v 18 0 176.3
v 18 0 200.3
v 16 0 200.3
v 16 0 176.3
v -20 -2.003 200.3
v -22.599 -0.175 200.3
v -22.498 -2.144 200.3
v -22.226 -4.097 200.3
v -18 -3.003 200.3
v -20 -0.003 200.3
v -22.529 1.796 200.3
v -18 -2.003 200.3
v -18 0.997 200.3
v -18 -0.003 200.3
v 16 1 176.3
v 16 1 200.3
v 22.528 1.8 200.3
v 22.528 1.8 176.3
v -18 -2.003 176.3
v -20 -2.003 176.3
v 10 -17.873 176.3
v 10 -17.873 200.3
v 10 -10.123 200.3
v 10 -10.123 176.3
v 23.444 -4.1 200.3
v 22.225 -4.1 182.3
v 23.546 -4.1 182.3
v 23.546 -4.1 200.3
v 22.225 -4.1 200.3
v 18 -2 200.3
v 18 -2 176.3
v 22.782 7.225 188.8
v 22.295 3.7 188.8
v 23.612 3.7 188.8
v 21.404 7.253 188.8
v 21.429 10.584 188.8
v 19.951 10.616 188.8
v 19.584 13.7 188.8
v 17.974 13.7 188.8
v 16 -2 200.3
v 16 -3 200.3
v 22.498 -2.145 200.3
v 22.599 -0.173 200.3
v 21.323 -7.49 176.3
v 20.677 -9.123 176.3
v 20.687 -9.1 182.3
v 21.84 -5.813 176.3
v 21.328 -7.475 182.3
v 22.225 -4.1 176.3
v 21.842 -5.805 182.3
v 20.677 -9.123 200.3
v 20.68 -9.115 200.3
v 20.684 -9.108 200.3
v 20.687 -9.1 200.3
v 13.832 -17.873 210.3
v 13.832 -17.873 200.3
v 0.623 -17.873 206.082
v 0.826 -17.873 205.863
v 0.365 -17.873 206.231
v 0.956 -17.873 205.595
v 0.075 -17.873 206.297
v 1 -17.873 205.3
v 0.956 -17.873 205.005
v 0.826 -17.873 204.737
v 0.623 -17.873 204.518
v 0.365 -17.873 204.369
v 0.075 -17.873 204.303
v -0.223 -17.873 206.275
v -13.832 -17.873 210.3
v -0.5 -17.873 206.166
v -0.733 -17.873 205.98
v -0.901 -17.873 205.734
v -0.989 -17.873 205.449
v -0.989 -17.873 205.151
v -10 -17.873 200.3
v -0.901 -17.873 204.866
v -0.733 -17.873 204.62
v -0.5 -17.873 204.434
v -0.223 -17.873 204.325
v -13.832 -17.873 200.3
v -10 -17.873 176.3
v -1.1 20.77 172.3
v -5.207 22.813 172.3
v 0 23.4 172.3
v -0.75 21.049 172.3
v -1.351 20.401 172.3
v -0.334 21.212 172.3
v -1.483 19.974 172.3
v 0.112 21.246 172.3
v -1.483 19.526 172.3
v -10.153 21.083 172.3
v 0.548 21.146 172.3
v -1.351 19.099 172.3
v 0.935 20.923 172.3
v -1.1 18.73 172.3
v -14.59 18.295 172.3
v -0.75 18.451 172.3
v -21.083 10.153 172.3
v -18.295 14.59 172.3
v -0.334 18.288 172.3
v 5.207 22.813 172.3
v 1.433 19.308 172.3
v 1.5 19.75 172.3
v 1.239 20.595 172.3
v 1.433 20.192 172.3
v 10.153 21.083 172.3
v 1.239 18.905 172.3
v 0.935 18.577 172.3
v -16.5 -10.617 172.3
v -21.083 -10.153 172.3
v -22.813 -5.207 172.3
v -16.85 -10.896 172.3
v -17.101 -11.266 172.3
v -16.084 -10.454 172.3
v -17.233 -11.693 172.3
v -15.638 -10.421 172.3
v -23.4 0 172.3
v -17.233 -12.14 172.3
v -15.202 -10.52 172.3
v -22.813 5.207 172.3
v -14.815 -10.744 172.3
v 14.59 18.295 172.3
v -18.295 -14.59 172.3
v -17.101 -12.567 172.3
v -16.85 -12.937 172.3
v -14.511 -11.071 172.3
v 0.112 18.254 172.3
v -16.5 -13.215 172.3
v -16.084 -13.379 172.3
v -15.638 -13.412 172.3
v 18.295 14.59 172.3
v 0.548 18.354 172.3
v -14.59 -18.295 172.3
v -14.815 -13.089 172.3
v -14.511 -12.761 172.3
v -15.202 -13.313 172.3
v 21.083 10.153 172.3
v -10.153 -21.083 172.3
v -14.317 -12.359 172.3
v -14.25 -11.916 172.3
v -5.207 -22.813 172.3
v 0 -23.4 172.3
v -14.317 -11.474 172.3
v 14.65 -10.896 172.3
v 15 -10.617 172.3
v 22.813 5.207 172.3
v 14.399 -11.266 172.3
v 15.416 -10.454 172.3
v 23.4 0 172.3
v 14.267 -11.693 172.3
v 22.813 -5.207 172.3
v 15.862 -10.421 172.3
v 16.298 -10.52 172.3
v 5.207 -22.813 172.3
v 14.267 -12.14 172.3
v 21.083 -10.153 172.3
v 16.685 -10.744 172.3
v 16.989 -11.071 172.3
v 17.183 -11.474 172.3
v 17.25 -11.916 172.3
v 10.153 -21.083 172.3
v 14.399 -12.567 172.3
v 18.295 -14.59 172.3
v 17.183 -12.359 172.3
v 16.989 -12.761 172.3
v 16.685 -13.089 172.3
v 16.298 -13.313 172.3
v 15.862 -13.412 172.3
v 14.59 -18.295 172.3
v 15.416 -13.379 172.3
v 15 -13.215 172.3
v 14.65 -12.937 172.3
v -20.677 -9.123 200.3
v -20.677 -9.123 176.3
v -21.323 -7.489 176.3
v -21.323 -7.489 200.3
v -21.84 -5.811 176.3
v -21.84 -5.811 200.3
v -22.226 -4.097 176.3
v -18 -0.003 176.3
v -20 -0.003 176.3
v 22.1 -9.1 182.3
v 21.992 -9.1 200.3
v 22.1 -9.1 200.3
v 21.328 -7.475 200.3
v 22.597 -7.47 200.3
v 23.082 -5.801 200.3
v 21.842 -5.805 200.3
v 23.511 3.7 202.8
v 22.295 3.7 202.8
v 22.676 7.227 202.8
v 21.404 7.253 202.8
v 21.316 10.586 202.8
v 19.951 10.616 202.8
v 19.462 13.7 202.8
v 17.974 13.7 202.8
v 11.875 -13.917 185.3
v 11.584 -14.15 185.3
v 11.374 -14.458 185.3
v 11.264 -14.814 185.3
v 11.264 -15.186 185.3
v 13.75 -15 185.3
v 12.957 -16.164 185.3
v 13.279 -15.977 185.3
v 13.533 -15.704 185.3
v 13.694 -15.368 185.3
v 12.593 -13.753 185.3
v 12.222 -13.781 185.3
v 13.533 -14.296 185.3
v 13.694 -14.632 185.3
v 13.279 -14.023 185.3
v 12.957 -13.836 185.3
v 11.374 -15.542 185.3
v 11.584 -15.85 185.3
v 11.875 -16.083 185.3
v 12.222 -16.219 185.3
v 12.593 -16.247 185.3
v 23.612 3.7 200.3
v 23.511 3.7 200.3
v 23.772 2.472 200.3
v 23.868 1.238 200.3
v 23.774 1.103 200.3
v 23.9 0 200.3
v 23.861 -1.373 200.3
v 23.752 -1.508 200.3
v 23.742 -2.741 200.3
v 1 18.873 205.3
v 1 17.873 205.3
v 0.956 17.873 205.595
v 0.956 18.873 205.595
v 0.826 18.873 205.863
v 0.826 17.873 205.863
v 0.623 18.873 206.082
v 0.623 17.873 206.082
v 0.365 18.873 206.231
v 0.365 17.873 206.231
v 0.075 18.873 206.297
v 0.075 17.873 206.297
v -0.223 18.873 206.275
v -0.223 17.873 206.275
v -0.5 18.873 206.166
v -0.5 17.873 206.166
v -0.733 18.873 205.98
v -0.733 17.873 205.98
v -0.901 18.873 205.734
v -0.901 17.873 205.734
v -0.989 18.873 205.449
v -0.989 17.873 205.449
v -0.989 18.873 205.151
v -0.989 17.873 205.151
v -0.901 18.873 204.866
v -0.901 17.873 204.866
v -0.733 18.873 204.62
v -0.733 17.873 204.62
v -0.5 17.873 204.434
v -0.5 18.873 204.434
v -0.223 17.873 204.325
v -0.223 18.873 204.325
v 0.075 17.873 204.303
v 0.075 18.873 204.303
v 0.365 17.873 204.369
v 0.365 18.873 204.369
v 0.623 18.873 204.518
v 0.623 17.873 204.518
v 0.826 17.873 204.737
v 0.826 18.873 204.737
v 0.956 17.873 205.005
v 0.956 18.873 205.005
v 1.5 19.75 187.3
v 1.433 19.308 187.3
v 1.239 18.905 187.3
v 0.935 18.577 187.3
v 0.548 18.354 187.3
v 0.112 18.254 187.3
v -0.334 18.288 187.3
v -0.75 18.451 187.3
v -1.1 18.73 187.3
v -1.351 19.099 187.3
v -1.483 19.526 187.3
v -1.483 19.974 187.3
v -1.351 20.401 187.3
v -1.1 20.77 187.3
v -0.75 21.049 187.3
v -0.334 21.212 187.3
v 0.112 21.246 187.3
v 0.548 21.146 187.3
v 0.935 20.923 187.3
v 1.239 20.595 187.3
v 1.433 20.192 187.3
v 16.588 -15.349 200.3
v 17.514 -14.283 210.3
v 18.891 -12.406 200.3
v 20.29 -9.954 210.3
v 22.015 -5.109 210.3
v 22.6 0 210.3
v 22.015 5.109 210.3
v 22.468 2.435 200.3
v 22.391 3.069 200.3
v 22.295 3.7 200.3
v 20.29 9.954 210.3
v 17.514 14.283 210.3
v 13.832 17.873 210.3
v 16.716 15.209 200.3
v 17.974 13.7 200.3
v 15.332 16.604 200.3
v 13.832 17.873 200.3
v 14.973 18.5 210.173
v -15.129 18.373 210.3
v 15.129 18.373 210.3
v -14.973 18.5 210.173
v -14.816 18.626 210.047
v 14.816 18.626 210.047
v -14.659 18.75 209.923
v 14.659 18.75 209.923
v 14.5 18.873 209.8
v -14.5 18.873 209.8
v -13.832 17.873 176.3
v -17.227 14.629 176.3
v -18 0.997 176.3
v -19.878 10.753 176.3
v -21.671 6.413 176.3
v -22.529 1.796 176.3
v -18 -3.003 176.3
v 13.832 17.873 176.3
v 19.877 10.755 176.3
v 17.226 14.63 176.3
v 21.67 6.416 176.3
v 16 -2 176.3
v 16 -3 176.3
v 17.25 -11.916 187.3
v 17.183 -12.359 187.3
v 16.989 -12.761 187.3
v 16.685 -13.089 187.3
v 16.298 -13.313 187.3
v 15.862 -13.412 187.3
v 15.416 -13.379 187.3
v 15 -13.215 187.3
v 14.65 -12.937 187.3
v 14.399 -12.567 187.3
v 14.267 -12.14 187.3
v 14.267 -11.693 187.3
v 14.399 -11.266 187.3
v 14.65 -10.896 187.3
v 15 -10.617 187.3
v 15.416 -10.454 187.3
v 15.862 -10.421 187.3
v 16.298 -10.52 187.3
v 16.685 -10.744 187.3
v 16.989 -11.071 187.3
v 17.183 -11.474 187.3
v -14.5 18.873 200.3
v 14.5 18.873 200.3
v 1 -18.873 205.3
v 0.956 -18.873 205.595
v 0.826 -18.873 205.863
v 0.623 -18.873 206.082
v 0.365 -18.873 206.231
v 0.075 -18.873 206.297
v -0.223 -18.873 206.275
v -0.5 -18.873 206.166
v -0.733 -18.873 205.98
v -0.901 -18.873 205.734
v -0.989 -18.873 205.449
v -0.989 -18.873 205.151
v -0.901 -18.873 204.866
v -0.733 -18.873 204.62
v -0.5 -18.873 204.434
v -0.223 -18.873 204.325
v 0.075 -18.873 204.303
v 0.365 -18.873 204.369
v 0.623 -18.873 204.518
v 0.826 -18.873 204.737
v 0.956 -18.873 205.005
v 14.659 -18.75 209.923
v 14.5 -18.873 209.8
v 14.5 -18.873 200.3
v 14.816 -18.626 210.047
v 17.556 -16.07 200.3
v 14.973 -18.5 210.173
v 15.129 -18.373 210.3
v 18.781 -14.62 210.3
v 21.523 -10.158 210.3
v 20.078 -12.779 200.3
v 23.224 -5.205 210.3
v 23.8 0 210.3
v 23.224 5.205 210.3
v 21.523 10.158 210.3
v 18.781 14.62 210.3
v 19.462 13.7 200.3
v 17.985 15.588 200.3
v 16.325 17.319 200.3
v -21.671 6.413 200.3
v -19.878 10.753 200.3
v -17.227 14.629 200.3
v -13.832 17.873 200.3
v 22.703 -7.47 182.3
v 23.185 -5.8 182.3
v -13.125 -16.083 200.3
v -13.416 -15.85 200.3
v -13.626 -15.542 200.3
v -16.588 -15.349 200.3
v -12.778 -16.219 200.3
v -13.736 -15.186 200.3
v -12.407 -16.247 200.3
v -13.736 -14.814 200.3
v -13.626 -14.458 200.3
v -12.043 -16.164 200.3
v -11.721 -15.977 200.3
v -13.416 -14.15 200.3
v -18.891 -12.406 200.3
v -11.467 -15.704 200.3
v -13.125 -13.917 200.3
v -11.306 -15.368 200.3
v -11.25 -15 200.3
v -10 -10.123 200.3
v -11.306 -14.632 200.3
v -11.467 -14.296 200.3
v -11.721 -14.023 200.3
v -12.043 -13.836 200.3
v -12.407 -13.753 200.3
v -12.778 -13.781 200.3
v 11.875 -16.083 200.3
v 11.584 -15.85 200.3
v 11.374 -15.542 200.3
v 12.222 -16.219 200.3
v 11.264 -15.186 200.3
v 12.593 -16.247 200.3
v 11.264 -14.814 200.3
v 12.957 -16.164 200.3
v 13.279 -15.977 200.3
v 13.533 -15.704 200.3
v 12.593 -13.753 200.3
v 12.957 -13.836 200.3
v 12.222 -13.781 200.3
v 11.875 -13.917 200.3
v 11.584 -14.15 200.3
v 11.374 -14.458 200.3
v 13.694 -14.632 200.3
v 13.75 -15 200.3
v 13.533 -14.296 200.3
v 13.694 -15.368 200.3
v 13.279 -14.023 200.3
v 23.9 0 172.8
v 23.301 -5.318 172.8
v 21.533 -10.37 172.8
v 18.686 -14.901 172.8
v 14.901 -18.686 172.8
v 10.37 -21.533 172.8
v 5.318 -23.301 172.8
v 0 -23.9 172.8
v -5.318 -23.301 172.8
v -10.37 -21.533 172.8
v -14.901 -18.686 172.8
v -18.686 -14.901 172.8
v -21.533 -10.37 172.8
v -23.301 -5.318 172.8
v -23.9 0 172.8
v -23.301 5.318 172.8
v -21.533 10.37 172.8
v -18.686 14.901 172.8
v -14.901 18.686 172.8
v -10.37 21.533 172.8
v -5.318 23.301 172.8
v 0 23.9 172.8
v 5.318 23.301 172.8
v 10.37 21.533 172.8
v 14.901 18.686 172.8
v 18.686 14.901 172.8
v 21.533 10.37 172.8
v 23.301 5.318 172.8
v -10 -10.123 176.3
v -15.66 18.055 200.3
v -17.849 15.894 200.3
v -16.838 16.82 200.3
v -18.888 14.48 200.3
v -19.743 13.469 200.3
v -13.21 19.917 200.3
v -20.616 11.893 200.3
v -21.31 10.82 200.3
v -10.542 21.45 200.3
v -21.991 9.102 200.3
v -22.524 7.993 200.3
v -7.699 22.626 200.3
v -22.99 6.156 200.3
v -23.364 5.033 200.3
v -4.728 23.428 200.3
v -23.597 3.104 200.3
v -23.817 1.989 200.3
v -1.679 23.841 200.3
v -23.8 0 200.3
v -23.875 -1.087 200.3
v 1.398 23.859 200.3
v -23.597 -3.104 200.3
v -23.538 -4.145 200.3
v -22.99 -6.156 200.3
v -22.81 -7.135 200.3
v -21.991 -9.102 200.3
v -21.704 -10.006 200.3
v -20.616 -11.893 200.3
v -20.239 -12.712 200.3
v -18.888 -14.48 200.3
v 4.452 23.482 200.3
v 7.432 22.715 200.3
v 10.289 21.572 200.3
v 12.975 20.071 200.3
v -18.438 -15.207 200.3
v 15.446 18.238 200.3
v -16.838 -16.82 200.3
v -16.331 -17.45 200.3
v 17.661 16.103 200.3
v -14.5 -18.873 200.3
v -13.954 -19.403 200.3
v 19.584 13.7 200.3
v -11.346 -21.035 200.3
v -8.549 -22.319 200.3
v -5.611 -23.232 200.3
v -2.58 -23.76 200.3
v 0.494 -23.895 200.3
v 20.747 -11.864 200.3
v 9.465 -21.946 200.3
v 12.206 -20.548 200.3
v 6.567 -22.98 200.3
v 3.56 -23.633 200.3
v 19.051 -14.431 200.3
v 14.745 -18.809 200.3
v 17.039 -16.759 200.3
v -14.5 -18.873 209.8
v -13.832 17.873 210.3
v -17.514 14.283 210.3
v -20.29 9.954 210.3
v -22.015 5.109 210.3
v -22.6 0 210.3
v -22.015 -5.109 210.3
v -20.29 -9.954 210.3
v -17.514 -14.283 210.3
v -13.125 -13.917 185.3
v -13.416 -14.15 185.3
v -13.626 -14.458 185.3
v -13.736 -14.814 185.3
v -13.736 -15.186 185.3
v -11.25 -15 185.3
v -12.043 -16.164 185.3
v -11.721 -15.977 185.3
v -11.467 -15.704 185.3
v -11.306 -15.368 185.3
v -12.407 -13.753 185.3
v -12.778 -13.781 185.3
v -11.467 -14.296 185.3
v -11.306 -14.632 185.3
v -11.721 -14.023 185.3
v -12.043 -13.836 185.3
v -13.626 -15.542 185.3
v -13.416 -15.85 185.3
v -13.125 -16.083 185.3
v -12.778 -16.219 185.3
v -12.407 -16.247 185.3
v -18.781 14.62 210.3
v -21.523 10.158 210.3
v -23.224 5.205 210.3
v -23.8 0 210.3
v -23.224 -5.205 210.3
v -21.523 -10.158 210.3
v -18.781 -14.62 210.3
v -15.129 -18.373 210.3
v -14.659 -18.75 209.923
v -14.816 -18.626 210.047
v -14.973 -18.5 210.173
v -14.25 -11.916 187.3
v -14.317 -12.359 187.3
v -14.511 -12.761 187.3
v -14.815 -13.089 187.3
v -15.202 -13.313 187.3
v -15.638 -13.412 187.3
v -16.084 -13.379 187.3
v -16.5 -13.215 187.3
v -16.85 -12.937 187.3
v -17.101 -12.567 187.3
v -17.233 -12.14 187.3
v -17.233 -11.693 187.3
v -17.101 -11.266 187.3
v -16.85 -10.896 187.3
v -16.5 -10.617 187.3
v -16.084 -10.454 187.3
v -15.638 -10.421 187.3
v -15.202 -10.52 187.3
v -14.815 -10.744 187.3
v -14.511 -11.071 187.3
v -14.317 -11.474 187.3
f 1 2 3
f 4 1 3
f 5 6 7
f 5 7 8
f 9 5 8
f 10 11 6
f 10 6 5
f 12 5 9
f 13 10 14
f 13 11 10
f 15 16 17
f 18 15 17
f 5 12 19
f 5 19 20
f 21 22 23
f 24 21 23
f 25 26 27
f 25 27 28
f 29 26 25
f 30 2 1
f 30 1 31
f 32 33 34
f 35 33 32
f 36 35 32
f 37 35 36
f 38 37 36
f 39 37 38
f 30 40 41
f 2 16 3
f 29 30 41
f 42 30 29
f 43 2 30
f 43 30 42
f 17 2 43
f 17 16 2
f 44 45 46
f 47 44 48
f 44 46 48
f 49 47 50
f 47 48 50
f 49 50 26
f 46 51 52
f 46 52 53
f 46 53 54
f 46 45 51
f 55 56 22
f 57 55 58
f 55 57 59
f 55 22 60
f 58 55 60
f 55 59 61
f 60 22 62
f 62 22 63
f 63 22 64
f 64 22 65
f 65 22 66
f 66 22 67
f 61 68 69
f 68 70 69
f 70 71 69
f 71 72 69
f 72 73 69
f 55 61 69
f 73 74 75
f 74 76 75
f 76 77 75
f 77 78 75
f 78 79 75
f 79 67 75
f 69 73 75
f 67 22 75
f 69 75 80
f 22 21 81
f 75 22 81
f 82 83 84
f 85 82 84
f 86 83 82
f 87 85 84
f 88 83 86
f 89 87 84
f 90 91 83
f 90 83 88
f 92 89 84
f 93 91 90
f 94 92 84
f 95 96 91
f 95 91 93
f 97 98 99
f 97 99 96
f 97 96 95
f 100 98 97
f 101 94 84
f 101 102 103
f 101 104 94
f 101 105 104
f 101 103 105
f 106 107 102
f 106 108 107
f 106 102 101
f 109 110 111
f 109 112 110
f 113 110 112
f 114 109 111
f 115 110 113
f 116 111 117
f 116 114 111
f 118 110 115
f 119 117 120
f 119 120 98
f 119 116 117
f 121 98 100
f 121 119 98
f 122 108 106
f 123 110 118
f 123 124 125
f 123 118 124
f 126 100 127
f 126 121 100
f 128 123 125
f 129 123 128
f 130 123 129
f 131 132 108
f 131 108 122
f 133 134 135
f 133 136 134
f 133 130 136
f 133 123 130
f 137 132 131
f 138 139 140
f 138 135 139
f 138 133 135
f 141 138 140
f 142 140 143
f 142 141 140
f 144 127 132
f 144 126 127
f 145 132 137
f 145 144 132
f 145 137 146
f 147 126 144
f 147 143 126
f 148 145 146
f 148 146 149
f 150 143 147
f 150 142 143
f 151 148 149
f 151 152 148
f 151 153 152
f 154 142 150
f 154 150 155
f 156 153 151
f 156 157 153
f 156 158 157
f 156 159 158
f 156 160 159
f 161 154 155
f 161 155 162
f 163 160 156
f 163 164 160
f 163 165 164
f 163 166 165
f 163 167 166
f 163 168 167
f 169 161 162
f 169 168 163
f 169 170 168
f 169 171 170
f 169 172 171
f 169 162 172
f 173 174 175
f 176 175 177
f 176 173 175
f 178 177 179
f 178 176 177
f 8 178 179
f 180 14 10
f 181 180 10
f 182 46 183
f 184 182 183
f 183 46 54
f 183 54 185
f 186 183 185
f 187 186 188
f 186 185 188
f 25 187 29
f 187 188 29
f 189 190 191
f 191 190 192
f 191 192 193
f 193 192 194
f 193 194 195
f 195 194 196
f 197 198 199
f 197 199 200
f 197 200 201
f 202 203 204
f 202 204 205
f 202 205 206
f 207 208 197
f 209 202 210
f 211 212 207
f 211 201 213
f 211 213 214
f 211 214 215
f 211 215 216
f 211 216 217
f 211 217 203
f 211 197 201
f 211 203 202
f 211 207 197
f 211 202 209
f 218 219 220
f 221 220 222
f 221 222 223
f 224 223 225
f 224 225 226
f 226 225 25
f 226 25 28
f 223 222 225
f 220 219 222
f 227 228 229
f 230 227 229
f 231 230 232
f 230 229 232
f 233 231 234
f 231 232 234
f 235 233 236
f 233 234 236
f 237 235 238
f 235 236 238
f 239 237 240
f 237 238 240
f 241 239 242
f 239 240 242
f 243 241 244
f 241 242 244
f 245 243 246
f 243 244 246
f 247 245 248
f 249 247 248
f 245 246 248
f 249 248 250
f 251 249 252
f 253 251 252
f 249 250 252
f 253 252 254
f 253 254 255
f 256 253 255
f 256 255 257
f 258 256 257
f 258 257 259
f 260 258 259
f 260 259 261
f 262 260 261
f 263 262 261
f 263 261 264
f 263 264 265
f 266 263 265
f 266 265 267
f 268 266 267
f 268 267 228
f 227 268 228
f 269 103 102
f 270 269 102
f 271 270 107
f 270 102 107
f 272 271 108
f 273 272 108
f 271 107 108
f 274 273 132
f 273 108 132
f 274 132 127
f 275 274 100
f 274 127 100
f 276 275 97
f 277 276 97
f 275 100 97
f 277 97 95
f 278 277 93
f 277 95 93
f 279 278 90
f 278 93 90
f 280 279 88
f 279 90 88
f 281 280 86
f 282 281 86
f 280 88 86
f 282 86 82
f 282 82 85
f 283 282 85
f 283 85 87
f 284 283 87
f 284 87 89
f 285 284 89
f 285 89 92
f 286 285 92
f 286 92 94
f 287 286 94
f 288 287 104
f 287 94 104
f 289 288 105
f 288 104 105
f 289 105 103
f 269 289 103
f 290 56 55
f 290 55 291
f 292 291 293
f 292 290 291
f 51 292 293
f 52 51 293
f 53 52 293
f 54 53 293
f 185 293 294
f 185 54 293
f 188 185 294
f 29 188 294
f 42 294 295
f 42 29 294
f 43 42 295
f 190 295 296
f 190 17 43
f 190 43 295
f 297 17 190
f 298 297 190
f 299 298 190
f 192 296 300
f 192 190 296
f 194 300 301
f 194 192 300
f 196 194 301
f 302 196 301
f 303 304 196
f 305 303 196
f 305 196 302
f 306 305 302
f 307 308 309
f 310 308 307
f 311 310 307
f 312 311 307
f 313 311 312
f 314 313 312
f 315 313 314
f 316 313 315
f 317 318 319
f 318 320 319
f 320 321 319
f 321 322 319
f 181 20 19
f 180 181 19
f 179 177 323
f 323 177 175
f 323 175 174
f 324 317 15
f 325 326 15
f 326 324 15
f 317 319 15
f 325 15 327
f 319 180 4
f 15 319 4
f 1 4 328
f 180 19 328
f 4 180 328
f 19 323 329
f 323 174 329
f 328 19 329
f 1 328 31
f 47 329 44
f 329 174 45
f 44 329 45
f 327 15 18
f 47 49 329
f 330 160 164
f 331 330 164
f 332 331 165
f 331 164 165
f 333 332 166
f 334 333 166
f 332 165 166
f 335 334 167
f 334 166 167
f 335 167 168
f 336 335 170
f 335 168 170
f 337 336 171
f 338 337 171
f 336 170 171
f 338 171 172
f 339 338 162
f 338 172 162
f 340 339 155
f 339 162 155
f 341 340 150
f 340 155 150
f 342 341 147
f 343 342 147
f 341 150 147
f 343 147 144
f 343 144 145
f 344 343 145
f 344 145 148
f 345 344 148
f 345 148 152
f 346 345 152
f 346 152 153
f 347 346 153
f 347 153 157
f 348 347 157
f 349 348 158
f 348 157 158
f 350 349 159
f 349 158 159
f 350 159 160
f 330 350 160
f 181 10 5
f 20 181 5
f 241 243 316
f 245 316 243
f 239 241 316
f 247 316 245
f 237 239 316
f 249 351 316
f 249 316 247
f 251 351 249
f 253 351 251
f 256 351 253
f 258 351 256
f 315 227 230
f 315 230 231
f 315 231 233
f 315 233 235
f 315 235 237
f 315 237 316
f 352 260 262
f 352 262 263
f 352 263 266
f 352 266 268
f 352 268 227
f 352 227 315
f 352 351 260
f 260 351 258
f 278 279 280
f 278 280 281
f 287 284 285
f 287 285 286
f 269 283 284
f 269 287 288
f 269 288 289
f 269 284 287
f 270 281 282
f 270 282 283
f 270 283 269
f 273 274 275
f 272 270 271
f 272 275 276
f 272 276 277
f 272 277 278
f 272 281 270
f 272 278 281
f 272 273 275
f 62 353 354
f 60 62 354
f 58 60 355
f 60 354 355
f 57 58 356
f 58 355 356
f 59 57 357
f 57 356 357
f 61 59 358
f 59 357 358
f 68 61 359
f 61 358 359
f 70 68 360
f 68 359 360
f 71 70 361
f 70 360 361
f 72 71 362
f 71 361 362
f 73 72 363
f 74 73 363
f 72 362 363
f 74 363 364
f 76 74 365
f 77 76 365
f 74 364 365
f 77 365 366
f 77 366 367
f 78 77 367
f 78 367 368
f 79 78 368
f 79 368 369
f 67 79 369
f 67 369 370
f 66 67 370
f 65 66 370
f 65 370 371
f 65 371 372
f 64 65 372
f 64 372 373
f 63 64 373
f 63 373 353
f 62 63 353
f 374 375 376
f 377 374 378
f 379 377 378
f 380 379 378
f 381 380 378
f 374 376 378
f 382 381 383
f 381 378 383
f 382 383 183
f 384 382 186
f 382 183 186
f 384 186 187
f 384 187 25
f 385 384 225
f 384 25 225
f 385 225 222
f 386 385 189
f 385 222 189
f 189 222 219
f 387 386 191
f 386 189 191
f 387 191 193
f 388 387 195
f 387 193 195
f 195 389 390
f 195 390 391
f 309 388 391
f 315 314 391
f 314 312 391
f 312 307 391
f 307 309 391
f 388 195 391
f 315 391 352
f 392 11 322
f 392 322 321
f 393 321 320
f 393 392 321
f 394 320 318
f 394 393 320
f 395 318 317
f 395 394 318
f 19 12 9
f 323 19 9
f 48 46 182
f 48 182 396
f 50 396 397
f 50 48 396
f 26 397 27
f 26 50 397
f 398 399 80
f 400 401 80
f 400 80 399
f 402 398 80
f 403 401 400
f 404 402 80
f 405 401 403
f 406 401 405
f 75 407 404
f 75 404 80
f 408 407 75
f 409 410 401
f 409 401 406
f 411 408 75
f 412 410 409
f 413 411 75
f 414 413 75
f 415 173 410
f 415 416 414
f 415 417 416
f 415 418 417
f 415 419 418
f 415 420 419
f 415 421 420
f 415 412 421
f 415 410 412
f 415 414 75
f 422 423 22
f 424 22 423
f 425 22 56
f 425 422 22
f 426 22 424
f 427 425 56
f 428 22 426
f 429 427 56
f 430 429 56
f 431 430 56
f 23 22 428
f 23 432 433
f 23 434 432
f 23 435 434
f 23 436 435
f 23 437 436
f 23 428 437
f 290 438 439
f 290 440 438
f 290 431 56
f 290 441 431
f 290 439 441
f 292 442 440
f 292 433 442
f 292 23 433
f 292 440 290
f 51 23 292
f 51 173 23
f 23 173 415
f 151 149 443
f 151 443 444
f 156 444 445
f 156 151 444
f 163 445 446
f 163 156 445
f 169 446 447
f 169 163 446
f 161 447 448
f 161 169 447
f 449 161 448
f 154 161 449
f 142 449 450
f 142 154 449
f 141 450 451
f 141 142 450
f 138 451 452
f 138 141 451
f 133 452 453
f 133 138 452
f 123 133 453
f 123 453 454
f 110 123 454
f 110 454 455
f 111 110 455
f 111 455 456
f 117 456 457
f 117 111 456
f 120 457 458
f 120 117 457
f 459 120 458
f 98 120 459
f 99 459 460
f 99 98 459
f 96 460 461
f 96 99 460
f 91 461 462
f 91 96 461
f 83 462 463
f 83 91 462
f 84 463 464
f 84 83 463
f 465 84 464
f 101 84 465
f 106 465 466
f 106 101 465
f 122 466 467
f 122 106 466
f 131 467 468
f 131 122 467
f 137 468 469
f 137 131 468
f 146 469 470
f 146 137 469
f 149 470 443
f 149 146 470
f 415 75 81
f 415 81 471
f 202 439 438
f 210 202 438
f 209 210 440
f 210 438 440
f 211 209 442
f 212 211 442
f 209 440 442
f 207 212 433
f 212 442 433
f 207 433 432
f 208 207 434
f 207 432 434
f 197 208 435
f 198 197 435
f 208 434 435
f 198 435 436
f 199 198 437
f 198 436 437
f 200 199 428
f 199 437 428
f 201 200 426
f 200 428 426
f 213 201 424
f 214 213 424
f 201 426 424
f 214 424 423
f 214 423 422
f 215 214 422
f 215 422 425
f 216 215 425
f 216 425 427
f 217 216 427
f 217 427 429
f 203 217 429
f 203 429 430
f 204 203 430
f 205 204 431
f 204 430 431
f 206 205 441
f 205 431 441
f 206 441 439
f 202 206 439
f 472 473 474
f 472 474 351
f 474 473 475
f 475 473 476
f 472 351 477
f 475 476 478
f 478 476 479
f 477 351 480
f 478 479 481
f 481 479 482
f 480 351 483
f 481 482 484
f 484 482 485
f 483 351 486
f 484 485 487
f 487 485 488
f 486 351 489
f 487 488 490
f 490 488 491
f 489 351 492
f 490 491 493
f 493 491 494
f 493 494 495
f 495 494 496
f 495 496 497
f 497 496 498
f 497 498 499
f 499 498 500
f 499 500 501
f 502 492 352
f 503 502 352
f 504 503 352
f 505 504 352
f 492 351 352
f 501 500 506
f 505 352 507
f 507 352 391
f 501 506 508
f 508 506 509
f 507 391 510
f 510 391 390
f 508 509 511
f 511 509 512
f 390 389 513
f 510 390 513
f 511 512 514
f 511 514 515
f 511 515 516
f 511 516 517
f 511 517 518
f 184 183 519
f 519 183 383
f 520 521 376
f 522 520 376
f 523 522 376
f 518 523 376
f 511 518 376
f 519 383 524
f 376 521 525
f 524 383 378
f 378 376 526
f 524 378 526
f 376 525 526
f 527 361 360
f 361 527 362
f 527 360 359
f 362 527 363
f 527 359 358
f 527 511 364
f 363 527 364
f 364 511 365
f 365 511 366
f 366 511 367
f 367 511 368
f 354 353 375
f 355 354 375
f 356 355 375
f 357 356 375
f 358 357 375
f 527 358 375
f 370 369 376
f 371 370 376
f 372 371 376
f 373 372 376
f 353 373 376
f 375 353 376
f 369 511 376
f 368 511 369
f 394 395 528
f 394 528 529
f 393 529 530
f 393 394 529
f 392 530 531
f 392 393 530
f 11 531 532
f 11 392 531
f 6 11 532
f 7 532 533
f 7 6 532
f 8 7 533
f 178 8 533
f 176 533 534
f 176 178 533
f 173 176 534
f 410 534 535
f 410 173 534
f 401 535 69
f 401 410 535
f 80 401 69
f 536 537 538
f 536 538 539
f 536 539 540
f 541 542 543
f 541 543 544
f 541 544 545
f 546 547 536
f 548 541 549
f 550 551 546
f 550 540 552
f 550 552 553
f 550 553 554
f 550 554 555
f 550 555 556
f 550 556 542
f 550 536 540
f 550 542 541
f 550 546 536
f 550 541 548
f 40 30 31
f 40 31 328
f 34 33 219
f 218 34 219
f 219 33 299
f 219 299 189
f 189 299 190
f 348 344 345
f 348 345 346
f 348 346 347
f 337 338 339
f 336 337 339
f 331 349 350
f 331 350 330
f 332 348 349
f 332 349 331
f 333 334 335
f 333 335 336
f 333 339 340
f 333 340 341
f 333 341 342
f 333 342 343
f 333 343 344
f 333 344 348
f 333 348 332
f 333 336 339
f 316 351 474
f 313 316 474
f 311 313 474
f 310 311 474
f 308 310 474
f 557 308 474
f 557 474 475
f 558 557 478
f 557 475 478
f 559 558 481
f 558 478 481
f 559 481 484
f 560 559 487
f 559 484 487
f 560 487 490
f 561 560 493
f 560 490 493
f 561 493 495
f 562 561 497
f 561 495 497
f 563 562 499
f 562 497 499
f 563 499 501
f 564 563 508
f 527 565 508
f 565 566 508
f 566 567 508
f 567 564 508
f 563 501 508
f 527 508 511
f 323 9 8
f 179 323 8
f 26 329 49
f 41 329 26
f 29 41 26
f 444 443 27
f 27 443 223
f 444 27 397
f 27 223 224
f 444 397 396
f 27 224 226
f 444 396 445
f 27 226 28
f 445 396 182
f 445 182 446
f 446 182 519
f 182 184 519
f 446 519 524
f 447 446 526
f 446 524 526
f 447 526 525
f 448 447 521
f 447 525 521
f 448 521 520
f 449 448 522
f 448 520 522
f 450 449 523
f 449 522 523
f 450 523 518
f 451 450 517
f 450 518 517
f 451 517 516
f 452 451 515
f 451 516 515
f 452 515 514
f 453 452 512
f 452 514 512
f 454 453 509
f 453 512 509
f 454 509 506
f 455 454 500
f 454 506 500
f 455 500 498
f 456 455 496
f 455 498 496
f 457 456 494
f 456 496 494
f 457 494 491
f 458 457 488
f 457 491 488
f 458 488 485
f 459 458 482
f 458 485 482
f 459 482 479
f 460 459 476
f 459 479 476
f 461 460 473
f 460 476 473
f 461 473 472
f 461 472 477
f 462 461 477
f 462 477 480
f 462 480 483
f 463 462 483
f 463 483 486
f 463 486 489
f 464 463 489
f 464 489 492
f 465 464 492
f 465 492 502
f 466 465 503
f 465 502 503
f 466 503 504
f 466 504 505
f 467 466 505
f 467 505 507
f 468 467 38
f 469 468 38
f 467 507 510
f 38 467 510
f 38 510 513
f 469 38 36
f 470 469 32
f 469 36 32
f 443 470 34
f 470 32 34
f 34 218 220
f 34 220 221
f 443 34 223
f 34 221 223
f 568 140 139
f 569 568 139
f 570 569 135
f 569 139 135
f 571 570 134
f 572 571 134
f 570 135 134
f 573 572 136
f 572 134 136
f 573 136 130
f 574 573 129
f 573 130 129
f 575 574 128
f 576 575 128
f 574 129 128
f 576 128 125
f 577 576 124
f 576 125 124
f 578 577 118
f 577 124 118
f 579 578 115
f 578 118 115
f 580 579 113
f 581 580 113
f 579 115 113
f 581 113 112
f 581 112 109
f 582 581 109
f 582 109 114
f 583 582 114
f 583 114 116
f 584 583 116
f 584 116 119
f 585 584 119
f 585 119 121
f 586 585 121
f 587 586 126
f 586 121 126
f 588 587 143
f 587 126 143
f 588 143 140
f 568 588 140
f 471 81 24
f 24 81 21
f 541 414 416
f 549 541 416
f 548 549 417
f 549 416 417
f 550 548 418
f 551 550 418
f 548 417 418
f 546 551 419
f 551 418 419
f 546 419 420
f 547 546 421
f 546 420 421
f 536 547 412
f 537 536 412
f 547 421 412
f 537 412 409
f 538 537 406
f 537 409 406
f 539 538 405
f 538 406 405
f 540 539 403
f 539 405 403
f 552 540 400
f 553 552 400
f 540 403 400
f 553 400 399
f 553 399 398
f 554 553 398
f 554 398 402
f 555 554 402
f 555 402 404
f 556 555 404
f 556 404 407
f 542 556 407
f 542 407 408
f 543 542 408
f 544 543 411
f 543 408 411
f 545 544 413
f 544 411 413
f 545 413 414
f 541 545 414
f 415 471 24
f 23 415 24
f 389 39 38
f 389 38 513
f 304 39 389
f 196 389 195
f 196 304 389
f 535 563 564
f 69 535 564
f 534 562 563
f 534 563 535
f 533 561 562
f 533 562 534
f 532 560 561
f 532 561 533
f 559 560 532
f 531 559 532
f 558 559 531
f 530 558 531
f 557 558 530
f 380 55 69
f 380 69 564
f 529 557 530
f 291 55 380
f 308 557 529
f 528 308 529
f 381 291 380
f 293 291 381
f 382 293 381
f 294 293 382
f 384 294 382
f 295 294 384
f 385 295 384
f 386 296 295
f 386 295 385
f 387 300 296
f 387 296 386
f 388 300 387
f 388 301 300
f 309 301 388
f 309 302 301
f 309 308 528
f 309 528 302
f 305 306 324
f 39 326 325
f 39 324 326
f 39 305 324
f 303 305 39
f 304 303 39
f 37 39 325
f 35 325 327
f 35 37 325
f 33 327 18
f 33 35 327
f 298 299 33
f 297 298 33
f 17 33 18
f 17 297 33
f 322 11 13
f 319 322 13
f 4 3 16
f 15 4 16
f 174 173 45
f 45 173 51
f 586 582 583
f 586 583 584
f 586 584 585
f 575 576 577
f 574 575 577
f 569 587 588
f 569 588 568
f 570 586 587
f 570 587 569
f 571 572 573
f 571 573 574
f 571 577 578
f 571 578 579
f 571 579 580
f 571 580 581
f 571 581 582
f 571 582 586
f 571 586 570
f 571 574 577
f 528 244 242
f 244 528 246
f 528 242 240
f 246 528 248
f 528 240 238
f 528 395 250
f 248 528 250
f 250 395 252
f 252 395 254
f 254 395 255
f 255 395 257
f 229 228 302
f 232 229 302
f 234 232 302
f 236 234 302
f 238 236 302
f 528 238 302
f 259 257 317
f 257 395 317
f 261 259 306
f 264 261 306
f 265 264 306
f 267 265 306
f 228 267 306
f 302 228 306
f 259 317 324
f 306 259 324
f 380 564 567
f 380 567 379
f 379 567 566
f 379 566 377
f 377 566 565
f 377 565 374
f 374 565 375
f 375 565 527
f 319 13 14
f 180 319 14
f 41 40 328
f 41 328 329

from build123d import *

# Parameters (mm, degrees)
PAD022_DEPTH    = 10
CHAMFER009_SIZE = 0.5
SKETCH040_R     = 23.9
SKETCH040_R_2   = 22.6
PAD023_DEPTH    = 24
SKETCH041_R     = 23.5
SKETCH041_W     = 20
SKETCH041_H     = 7.75
PAD024_DEPTH    = 24
SKETCH042_R     = 23.9
PAD025_DEPTH    = 4
CHAMFER010_SIZE = 0.5
SKETCH043_R     = 1.5
POCKET013_DEPTH = 15
SKETCH044_R     = 1
POCKET014_DEPTH = 100
SKETCH045_R     = 1.25
POCKET015_DEPTH = 15
SKETCH052_W     = 5
SKETCH052_H     = 18
POCKET019_DEPTH = 41
SKETCH055_W     = 10
SKETCH055_H     = 14
POCKET021_DEPTH = 33


with BuildPart() as part:
    # Sketch039 → Pad022 (new body)
    with BuildSketch(Plane.XY):
        with BuildLine():
            ThreePointArc((-14.5, 18.872997), (-23.8, 0), (-14.5, -18.872997))
            Line((-14.5, -18.872997), (14.5, -18.872997))
            ThreePointArc((14.5, -18.872997), (23.8, 0), (14.5, 18.872997))
            Line((-14.5, 18.872997), (14.5, 18.872997))
        make_face()
        with BuildLine():
            ThreePointArc((-13.831702, 17.872997), (-22.6, 0), (-13.831702, -17.872997))
            Line((13.831702, -17.872997), (-13.831702, -17.872997))
            ThreePointArc((13.831702, -17.872997), (22.6, 0), (13.831702, 17.872997))
            Line((-13.831702, 17.872997), (13.831702, 17.872997))
        make_face(mode=Mode.SUBTRACT)
    extrude(amount=PAD022_DEPTH)

    # Chamfer009
    chamfer009_edges = [part.edges().sort_by_distance(p)[0] for p in [
        (0, -18.872997, 10),
        (0, 18.872997, 10),
    ]]
    chamfer(chamfer009_edges, length=CHAMFER009_SIZE)

    # Sketch040 (on Face4 of Chamfer009) → Pad023 (join)
    with BuildSketch(Plane(origin=(0, 0, 0), x_dir=(1, 0, 0), z_dir=(0, 0, -1))):
        Circle(SKETCH040_R)
        Circle(SKETCH040_R_2, mode=Mode.SUBTRACT)
    extrude(amount=PAD023_DEPTH)

    # Sketch041 (on Face4 of Pad023) → Pad024 (join)
    with BuildSketch(Plane.XY):
        Circle(SKETCH041_R)
        with BuildLine():
            Line((-22.528563, 1.795511), (-18, 0.997003))
            Line((-18, 0.997003), (-18, -0.002997))
            Line((-18, -0.002997), (-20, -0.002997))
            Line((-20, -0.002997), (-20, -2.002997))
            Line((-18, -2.002997), (-20, -2.002997))
            Line((-18, -2.002997), (-18, -3.002997))
            Line((-18, -3.002997), (-22.225594, -4.096705))
            ThreePointArc((-22.225594, -4.096705), (-21.597921, -6.655058), (-20.676821, -9.122997))
            Line((-20.676821, -9.122997), (20.676821, -9.122997))
            ThreePointArc((20.676821, -9.122997), (21.597428, -6.656659), (22.224986, -4.1))
            Line((16, -3), (22.224986, -4.1))
            Line((16, -2), (16, -3))
            Line((18, -2), (16, -2))
            Line((18, 0), (18, -2))
            Line((18, 0), (16, 0))
            Line((16, 0), (16, 1))
            Line((16, 1), (22.528205, 1.8))
            ThreePointArc((22.528205, 1.8), (19.877022, 10.754719), (13.831702, 17.872997))
            Line((13.831702, 17.872997), (-13.831702, 17.872997))
            ThreePointArc((-13.831702, 17.872997), (-19.878094, 10.752739), (-22.528563, 1.795511))
        make_face(mode=Mode.SUBTRACT)
        with Locations((0, -13.997997)):
            Rectangle(SKETCH041_W, SKETCH041_H, mode=Mode.SUBTRACT)
    extrude(amount=-PAD024_DEPTH)

    # Sketch042 (on Face49 of Pad024) → Pad025 (join)
    with BuildSketch(Plane(origin=(0, 0, -24), x_dir=(1, 0, 0), z_dir=(0, 0, -1))):
        Circle(SKETCH042_R)
    extrude(amount=PAD025_DEPTH)

    # Chamfer010
    chamfer010_edges = [part.edges().sort_by_distance(p)[0] for p in [
        (-23.9, 0, -28),
    ]]
    chamfer(chamfer010_edges, length=CHAMFER010_SIZE)

    # Sketch043 (on Face4 of Chamfer010) → Pocket013 (cut)
    with BuildSketch(Plane(origin=(0, 0, -28), x_dir=(1, 0, 0), z_dir=(0, 0, -1))):
        with Locations((-15.75, 11.916375)):
            Circle(SKETCH043_R)
        with Locations((15.75, 11.916375)):
            Circle(SKETCH043_R)
        with Locations((0, -19.75)):
            Circle(SKETCH043_R)
    extrude(amount=-POCKET013_DEPTH, mode=Mode.SUBTRACT)

    # Sketch044 (on Face9 of Pocket013) → Pocket014 (cut)
    with BuildSketch(Plane.XZ.offset(18.872997)):
        with Locations((0, 5)):
            Circle(SKETCH044_R)
    extrude(amount=-POCKET014_DEPTH, mode=Mode.SUBTRACT)

    # Sketch045 (on Face29 of Pocket014) → Pocket015 (cut)
    with BuildSketch(Plane.XY):
        with Locations((12.5, -15)):
            Circle(SKETCH045_R)
        with Locations((-12.5, -15)):
            Circle(SKETCH045_R)
    extrude(amount=-POCKET015_DEPTH, mode=Mode.SUBTRACT)

    # Sketch052 → Pocket019 (cut)
    with BuildSketch(Plane.YZ):
        with Locations((-6.6, -9)):
            Rectangle(SKETCH052_W, SKETCH052_H)
    extrude(amount=POCKET019_DEPTH, mode=Mode.SUBTRACT)

    # Sketch055 → Pocket021 (cut)
    with BuildSketch(Plane.YZ):
        with Locations((8.7, -4.5)):
            Rectangle(SKETCH055_W, SKETCH055_H)
    extrude(amount=POCKET021_DEPTH, mode=Mode.SUBTRACT)


with BuildPart() as part_1:
    # Body017 placement: moved
    add(part.part.moved(Location((0, 0, 200.3))))


solid = part_1.part
